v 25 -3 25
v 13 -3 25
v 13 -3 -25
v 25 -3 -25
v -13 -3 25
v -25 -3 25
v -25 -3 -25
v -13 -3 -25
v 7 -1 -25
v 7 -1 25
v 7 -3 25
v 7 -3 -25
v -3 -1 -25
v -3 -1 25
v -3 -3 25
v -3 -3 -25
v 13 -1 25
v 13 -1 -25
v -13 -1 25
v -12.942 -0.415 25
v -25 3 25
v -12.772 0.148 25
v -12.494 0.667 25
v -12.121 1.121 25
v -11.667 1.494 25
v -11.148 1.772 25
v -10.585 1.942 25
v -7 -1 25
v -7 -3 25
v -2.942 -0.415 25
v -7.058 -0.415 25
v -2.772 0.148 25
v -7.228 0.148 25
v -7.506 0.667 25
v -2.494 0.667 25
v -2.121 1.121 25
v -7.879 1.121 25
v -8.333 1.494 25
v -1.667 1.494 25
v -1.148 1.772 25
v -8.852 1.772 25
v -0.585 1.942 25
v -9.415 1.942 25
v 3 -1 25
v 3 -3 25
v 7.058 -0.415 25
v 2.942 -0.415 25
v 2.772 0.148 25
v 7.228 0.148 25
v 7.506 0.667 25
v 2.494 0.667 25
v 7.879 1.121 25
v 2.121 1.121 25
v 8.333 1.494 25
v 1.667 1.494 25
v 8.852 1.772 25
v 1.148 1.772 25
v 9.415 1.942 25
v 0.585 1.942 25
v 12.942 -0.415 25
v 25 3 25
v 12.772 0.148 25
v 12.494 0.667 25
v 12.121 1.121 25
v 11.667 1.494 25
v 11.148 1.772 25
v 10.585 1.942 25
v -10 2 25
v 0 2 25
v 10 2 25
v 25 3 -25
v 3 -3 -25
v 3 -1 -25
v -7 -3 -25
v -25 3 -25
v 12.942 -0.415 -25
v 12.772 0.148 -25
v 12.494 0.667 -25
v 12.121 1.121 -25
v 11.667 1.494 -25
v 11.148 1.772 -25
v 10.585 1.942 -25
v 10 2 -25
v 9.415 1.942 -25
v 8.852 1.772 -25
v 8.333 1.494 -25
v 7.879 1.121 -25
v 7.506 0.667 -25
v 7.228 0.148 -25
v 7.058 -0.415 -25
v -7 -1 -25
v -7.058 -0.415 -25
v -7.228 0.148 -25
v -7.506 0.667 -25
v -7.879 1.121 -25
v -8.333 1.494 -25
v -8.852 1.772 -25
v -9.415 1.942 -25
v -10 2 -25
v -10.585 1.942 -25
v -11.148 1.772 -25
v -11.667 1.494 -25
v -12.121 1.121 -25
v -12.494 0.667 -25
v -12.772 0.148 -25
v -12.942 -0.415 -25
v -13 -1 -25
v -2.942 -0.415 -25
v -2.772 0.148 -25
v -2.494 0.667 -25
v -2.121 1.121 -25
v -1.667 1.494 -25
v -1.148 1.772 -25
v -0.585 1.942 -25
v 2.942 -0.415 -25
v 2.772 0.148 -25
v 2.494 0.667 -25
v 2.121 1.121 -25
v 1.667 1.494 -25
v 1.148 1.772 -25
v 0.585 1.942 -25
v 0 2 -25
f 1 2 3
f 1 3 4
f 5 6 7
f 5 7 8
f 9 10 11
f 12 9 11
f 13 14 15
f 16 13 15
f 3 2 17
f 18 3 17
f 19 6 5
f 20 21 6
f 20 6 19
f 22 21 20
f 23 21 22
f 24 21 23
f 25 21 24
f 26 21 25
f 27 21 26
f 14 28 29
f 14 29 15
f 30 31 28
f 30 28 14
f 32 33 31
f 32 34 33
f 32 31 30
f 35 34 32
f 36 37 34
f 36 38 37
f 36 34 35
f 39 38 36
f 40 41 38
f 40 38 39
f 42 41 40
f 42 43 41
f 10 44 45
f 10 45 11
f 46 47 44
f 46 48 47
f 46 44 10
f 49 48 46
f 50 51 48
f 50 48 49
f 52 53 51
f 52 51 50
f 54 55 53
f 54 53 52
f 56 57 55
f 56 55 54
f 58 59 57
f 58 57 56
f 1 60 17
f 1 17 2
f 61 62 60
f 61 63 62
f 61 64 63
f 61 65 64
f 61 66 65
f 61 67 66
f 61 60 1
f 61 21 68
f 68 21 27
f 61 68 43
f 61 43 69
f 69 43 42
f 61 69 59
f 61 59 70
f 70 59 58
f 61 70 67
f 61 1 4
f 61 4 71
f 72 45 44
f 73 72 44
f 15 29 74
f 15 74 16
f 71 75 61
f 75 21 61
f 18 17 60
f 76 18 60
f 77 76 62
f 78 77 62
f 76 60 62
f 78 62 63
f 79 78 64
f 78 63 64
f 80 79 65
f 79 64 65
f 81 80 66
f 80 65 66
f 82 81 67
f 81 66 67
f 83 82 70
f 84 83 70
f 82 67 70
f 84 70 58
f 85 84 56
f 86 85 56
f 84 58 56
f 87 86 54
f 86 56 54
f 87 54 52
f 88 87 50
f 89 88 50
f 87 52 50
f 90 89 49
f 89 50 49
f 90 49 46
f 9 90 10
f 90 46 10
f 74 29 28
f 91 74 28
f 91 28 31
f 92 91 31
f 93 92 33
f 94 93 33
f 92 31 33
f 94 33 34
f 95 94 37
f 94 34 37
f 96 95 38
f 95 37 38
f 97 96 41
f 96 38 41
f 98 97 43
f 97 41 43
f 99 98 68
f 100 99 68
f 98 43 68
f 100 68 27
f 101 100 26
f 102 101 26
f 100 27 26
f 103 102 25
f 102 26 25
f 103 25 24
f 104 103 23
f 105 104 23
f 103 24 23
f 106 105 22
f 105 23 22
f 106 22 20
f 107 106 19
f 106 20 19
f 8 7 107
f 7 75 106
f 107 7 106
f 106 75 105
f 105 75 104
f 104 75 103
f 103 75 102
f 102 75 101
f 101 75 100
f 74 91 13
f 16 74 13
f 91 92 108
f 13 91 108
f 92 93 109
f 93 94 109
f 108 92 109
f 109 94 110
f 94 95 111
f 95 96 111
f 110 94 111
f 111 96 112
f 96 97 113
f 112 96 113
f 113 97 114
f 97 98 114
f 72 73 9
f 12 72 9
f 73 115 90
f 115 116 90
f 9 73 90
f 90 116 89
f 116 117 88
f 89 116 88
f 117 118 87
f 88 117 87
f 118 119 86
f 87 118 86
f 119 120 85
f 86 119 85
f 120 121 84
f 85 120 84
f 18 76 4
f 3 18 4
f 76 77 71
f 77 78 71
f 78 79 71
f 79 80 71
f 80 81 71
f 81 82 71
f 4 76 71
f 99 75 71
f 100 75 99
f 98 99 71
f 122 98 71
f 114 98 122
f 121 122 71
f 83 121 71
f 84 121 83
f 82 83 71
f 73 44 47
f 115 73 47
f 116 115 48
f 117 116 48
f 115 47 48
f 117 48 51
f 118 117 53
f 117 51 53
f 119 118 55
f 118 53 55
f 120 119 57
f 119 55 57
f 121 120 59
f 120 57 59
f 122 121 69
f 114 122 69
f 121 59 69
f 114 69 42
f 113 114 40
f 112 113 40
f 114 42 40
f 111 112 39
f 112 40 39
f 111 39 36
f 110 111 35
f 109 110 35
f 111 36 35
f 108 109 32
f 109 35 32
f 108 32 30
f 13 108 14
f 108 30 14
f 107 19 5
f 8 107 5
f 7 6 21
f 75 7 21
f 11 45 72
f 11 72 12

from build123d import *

# Parameters (mm, degrees)
SKETCH_1_W                 = 50
SKETCH_1_H                 = 6
EXTRUDE_1_DEPTH            = 25
CUT_EXTRUDE_1_REACH        = 57.982
PATTERN_LINEAR_1_COUNT     = 2
PATTERN_LINEAR_1_PITCH     = 10
PATTERN_LINEAR_1_COL_COUNT = 2
PATTERN_LINEAR_1_COL_PITCH = 10


with BuildPart() as part:
    # 草图1 → 凸台-拉伸1 (new, symmetric)
    with BuildSketch(Plane.XY):
        Rectangle(SKETCH_1_W, SKETCH_1_H)
    extrude(amount=EXTRUDE_1_DEPTH, both=True)

    # 草图2 → 切除-拉伸1 (cut, up to next)
    with BuildSketch(Plane.XY.offset(25), mode=Mode.PRIVATE) as cut_extrude_1_sk1:
        with BuildLine():
            Line((-3, -1), (-3, -3))
            Line((-3, -3), (3, -3))
            Line((3, -3), (3, -1))
            ThreePointArc((3, -1), (0, 2), (-3, -1))
        make_face()
    cut_extrude_1_tool1 = extrude(cut_extrude_1_sk1.sketch, amount=-CUT_EXTRUDE_1_REACH, mode=Mode.PRIVATE) & part.part
    cut_extrude_1 = cut_extrude_1_tool1.solids().sort_by_distance((0, -0.770442, 25))[0]
    add(cut_extrude_1, mode=Mode.SUBTRACT)

    # 阵列(线性)1: 切除-拉伸1 ×2
    with Locations(*[(-i * PATTERN_LINEAR_1_PITCH, 0, 0) for i in range(1, PATTERN_LINEAR_1_COUNT)]):
        add(cut_extrude_1, mode=Mode.SUBTRACT)

    # 阵列(线性)1 col: 切除-拉伸1 ×2
    with Locations(*[(i * PATTERN_LINEAR_1_COL_PITCH, 0, 0) for i in range(1, PATTERN_LINEAR_1_COL_COUNT)]):
        add(cut_extrude_1, mode=Mode.SUBTRACT)


solid = part.part
